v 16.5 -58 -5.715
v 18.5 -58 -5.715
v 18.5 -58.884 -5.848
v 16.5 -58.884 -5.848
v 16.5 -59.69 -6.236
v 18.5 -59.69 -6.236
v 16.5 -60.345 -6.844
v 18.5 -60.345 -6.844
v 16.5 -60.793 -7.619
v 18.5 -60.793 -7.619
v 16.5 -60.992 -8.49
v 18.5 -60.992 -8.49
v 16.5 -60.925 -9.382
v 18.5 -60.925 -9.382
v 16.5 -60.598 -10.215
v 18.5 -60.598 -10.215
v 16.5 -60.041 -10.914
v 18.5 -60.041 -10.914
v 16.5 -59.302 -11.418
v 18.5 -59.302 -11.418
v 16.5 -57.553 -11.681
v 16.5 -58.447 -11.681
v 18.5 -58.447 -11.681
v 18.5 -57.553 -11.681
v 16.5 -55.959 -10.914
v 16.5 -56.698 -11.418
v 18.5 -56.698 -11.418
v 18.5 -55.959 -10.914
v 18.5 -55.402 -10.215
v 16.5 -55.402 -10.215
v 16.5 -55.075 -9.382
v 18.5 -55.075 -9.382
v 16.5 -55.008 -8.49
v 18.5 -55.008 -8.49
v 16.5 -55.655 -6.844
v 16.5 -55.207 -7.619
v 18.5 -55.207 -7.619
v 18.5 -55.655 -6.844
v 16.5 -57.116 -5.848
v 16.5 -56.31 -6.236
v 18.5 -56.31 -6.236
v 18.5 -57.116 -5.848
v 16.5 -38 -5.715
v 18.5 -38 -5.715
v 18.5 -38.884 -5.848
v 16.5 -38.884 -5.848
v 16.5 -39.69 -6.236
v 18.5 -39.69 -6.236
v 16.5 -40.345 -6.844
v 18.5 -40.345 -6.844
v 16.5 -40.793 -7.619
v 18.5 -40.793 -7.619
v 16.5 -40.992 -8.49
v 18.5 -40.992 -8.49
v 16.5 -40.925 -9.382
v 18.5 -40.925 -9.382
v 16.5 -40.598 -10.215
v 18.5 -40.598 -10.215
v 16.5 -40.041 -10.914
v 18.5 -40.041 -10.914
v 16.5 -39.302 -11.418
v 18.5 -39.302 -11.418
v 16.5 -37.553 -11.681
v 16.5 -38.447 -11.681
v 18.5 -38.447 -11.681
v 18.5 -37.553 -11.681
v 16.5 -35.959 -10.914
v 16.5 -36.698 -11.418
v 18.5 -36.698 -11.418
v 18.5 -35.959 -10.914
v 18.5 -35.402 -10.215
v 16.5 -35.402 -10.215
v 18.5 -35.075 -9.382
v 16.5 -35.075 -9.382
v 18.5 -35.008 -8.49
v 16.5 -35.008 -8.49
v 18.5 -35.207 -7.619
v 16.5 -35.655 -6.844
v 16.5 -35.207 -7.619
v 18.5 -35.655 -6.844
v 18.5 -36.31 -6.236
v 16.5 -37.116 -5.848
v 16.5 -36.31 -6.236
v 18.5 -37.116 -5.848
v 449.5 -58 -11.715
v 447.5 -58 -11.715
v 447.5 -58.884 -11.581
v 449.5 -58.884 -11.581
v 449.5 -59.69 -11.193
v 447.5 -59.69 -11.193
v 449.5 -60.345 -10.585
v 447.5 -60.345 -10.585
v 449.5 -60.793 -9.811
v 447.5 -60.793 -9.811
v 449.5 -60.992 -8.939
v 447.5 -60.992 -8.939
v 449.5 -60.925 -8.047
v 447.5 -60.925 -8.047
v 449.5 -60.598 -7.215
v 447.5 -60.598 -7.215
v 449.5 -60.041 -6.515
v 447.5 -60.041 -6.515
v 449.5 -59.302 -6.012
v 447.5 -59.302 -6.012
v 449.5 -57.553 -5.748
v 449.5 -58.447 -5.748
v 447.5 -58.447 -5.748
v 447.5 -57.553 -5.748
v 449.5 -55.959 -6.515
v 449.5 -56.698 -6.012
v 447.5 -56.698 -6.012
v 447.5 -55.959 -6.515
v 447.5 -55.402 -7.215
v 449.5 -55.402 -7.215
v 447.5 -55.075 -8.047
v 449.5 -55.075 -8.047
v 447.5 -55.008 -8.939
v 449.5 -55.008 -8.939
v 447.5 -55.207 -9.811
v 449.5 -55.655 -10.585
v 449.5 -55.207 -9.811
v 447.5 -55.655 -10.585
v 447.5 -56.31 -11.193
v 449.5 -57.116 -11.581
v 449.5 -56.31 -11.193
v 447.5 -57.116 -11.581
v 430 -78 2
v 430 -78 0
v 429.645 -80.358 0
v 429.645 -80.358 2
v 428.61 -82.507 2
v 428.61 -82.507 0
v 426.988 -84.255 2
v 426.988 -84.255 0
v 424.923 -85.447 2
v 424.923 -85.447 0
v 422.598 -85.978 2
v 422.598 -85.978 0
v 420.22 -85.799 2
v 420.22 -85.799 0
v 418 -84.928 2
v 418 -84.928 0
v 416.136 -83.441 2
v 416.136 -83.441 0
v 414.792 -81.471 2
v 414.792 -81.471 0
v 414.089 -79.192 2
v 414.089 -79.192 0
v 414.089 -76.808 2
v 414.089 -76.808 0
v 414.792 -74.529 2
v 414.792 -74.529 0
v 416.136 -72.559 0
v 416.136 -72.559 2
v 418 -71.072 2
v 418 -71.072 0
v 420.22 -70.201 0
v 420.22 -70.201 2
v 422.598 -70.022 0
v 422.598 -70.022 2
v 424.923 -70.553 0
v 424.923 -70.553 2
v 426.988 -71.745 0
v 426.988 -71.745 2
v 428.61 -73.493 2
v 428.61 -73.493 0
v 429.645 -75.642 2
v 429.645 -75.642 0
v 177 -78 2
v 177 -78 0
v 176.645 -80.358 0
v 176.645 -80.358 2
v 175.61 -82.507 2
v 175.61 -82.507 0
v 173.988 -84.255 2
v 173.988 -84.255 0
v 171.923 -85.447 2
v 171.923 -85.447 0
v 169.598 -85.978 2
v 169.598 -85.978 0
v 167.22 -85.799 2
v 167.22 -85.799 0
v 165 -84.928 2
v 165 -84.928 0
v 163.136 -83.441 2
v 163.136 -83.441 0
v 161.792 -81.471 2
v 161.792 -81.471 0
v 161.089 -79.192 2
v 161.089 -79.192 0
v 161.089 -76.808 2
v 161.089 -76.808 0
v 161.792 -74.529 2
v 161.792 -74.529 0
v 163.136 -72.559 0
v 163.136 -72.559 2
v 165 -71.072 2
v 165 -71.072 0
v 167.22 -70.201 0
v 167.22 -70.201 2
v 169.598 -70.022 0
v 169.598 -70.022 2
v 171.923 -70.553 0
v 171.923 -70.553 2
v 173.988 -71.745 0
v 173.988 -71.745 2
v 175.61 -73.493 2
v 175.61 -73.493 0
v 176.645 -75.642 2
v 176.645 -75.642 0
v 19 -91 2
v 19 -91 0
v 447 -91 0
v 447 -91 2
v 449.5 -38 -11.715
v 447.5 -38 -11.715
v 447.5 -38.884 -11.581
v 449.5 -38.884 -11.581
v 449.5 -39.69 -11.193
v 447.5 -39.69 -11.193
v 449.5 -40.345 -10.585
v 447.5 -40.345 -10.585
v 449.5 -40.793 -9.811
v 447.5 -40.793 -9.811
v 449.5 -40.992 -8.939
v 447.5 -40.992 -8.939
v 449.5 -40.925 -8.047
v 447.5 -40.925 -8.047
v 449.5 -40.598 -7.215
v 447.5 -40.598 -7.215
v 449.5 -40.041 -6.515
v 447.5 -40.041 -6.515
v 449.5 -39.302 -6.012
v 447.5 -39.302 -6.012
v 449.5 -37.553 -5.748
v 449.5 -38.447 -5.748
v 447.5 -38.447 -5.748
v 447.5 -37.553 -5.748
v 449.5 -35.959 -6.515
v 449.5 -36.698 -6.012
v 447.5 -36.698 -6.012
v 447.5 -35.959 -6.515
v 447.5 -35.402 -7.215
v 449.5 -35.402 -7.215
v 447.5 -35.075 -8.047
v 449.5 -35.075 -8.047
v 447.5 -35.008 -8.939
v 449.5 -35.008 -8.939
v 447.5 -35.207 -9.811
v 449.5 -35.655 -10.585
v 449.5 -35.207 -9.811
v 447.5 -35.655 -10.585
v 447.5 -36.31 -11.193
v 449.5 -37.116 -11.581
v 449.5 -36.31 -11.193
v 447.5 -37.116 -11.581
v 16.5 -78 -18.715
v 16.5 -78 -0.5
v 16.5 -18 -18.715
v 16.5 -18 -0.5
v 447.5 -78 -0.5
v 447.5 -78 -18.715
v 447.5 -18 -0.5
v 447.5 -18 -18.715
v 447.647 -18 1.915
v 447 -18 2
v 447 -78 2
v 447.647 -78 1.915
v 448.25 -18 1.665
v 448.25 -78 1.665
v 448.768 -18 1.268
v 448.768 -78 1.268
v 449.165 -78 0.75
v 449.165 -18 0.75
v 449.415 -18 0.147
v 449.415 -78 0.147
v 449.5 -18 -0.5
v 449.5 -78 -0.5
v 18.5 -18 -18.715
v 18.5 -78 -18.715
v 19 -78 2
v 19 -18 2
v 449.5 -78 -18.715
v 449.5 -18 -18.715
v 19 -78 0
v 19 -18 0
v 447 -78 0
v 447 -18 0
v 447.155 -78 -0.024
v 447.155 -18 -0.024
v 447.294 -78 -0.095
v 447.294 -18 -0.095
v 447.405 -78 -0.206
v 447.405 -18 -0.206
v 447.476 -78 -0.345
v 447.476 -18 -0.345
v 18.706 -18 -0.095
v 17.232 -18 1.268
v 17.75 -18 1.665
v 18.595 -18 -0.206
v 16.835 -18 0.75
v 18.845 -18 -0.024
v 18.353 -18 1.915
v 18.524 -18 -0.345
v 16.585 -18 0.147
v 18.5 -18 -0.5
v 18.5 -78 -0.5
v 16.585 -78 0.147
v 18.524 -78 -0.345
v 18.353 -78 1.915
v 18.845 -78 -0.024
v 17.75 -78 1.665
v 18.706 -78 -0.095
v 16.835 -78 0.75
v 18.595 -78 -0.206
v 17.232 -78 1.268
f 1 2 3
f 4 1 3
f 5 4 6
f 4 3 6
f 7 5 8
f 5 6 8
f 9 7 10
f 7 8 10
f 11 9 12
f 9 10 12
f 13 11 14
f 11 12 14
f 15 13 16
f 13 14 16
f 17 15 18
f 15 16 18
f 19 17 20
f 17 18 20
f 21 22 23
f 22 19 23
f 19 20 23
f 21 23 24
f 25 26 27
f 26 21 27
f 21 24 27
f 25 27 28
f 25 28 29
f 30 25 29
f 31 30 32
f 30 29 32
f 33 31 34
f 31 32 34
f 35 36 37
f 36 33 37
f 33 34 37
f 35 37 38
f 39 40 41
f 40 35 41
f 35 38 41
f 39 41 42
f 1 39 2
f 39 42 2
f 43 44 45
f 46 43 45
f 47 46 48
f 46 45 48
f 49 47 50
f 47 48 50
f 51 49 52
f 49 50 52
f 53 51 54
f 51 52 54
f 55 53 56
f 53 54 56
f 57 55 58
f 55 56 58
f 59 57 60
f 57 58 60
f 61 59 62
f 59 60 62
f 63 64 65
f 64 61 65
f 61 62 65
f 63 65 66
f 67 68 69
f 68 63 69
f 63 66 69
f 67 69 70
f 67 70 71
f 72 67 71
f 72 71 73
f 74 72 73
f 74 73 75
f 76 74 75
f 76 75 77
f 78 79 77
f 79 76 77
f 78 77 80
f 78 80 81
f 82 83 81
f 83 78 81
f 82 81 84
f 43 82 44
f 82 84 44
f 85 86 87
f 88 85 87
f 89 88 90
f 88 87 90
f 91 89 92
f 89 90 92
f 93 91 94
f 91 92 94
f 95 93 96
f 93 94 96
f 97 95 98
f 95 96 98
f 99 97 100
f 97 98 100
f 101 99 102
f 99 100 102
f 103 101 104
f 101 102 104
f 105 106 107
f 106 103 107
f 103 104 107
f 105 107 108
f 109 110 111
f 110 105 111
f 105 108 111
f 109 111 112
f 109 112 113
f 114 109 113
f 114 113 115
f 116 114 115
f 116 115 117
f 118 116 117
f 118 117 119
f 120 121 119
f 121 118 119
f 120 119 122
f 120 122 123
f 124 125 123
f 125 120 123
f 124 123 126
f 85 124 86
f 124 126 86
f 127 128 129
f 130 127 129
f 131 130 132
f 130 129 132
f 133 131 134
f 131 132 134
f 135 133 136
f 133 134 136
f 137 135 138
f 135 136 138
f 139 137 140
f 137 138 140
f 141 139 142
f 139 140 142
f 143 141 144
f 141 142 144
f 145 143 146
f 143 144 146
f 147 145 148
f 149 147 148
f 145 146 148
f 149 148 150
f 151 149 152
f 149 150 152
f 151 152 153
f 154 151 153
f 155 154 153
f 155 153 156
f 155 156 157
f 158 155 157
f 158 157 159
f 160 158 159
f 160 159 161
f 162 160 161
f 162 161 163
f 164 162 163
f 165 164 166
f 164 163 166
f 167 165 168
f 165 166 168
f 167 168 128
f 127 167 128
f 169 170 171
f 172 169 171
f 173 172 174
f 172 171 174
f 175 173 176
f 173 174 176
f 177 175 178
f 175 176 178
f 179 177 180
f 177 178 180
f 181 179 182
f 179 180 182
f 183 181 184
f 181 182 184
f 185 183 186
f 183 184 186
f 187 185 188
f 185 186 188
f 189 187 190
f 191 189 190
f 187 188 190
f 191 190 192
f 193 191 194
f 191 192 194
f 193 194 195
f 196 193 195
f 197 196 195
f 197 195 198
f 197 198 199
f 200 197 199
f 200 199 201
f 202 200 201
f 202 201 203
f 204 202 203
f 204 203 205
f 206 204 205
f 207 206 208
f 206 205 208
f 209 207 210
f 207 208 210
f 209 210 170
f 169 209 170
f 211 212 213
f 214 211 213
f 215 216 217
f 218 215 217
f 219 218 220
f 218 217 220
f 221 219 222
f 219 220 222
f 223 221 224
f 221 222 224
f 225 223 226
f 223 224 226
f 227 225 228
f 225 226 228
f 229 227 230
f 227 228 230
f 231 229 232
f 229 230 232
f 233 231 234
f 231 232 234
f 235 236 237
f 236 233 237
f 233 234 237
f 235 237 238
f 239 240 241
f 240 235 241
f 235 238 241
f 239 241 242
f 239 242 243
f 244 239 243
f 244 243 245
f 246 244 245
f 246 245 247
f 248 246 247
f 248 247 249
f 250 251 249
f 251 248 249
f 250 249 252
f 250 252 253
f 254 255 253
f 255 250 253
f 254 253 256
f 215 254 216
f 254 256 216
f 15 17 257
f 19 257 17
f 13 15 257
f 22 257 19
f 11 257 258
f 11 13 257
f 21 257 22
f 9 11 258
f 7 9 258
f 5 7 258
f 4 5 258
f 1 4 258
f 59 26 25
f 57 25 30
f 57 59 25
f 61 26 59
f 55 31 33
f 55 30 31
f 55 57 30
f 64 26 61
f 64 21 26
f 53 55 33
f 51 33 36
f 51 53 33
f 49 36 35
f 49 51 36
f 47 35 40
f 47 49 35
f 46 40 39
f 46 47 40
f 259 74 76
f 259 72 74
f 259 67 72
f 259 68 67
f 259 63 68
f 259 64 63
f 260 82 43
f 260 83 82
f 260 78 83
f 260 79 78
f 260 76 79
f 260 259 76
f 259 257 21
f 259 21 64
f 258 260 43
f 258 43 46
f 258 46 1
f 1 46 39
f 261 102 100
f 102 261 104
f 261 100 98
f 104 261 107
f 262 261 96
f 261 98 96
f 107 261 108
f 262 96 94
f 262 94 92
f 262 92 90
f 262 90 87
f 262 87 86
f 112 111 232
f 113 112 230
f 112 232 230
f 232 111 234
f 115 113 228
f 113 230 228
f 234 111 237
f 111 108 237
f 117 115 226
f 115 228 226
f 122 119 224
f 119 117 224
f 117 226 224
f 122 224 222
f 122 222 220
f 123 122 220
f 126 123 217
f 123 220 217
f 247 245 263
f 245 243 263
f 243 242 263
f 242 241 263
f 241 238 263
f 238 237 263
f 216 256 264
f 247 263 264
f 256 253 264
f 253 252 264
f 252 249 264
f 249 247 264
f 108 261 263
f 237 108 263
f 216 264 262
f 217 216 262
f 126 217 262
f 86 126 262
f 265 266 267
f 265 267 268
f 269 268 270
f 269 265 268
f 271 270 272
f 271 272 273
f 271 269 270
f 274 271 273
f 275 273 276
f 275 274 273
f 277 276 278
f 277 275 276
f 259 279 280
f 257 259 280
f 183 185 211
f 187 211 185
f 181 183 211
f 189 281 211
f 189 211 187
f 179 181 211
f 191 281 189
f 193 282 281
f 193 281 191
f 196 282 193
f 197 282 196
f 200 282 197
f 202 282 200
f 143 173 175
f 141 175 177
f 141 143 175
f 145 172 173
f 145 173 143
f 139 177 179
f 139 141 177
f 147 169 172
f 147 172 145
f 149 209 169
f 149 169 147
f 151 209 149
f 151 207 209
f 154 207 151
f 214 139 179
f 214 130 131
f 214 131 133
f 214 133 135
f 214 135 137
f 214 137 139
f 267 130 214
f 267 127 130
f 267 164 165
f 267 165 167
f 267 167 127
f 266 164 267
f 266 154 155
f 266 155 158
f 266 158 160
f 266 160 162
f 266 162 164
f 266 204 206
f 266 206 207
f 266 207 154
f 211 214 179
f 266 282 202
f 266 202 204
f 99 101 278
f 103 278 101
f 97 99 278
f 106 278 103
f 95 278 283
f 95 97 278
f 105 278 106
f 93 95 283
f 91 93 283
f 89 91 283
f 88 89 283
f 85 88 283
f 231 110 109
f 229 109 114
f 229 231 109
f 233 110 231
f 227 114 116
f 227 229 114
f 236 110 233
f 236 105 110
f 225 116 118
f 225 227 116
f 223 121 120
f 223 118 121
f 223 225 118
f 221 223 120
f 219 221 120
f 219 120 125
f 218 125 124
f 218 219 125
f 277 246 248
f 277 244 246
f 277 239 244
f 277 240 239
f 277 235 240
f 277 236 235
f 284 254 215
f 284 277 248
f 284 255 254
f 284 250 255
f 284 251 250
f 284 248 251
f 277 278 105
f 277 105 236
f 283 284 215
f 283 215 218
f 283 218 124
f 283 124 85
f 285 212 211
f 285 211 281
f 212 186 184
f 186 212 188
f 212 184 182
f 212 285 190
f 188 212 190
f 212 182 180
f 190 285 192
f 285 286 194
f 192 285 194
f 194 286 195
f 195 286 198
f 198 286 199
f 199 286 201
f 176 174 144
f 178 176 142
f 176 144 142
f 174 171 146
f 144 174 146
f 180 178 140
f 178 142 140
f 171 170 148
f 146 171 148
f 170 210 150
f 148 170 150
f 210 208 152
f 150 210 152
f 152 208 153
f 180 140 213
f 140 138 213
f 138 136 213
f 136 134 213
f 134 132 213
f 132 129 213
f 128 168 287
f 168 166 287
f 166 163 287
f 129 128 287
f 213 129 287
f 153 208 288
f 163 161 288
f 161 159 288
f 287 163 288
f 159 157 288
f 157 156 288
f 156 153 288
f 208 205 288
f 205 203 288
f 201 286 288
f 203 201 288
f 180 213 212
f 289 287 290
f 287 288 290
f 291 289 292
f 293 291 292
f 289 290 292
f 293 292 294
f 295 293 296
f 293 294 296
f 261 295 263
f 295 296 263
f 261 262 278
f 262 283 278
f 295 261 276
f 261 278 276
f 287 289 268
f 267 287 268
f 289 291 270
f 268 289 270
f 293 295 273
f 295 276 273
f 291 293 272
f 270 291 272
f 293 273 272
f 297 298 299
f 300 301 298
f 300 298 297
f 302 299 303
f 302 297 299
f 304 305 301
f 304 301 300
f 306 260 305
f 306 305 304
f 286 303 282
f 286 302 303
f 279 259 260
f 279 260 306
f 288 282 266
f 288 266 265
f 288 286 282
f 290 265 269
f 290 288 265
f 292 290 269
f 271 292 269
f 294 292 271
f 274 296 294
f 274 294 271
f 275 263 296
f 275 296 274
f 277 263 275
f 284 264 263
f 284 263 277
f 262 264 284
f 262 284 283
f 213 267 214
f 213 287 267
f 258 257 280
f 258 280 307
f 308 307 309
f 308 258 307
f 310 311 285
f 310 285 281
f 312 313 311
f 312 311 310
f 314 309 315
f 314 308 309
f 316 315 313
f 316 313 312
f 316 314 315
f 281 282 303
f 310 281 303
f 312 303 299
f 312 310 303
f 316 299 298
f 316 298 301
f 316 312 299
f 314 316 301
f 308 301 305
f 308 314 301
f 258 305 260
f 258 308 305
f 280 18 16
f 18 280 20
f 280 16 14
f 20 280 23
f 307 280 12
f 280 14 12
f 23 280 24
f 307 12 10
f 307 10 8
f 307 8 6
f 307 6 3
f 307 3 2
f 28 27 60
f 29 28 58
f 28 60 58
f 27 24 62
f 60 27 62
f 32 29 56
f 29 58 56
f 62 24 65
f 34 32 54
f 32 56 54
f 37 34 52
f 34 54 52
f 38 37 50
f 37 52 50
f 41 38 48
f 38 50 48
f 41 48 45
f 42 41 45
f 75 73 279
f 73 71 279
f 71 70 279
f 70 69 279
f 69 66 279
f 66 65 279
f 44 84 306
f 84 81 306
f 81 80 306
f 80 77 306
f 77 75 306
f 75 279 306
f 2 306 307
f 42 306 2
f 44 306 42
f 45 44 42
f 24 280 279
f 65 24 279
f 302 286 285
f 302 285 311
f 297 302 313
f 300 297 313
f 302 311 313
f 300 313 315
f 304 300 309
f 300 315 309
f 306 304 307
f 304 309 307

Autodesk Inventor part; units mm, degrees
ref_plane "YZ Plane" through (0, 0, 0) normal (1, 0, 0) x (0, 1, 0)
ref_plane "XZ Plane" through (0, 0, 0) normal (0, 1, 0) x (-1, 0, 0)
ref_plane "XY Plane" through (0, 0, 0) normal (0, 0, 1) x (1, 0, 0)
sketch "Sketch1" plane through (0, 0, 0) normal (0, 0, 1) x (1, 0, 0)
  line L0 (0, -18) -> (0, -78)
  line L1 (0, -78) -> (19, -78)
  line L2 (19, -78) -> (19, -18)
  line L3 (19, -18) -> (0, -18)
  line L4 (19, -18) -> (447, -18)
  line L5 (447, -18) -> (447, -78)
  line L6 (447, -78) -> (19, -78)
  line L7 (447, -18) -> (466, -18)
  line L8 (466, -18) -> (466, -78)
  line L9 (466, -78) -> (447, -78)
  circle A0 centre (10, -58) radius 3
  circle A1 centre (10, -38) radius 3
  circle A2 centre (456, -58) radius 3
  circle A3 centre (456, -38) radius 3
  line L10 (19, -78) -> (19, -91)
  line L11 (19, -91) -> (447, -91)
  line L12 (447, -91) -> (447, -78)
  circle A4 centre (169, -78) radius 8
  circle A5 centre (422, -78) radius 8
  dimension "d0" = 60
  dimension "d1" = 19
  dimension "d2" = 428
  dimension "d3" = 19
  dimension "d10" = 6
  dimension "d11" = 6
  dimension "d12" = 20
  dimension "d13" = 20
  dimension "d14" = 6
  dimension "d15" = 6
  dimension "d16" = 20
  dimension "d17" = 20
  dimension "d24" = 13
  dimension "d25" = 428
  dimension "d27" = 10
  dimension "d28" = 10
  dimension "d29" = 10
  dimension "d30" = 10
  dimension "d32" = 16
  dimension "d33" = 13
  dimension "d34" = 150
  dimension "d35" = 16
  dimension "d36" = 25
extrude "Extrusion1" add sketch "Sketch1" along normal blind 2 contours L3 L2 L1 L0
extrude "Extrusion2" add sketch "Sketch1" along normal blind 2 contours L4 L5 L6 A5 A4 L2 | L6 A4 A5 L12 L11 L10
extrude "Extrusion3" add sketch "Sketch1" along normal blind 2 contours L7 L8 L9 L5
bend part "Bend Part2" radius 0.5 angle 90 line through (447, -18, 0) along (0, -1, 0) centre toward (0, 0, -1) moving side (1, 0, 0) both sides no
bend part "Bend Part3" radius 0.5 angle 90 line through (19, -78, 0) along (0, 1, 0) centre toward (0, 0, -1) moving side (-1, 0, 0) both sides no
equation "\"d1\" = d3"
equation "\"d12\" = d13"
equation "\"d16\" = d13"
equation "\"d17\" = d13"
equation "\"d25\" = d2"
equation "\"d28\" = d27"
equation "\"d29\" = d27"
properties part number "Chapa de Refrigeración" material "Aluminum 1100-H14"
